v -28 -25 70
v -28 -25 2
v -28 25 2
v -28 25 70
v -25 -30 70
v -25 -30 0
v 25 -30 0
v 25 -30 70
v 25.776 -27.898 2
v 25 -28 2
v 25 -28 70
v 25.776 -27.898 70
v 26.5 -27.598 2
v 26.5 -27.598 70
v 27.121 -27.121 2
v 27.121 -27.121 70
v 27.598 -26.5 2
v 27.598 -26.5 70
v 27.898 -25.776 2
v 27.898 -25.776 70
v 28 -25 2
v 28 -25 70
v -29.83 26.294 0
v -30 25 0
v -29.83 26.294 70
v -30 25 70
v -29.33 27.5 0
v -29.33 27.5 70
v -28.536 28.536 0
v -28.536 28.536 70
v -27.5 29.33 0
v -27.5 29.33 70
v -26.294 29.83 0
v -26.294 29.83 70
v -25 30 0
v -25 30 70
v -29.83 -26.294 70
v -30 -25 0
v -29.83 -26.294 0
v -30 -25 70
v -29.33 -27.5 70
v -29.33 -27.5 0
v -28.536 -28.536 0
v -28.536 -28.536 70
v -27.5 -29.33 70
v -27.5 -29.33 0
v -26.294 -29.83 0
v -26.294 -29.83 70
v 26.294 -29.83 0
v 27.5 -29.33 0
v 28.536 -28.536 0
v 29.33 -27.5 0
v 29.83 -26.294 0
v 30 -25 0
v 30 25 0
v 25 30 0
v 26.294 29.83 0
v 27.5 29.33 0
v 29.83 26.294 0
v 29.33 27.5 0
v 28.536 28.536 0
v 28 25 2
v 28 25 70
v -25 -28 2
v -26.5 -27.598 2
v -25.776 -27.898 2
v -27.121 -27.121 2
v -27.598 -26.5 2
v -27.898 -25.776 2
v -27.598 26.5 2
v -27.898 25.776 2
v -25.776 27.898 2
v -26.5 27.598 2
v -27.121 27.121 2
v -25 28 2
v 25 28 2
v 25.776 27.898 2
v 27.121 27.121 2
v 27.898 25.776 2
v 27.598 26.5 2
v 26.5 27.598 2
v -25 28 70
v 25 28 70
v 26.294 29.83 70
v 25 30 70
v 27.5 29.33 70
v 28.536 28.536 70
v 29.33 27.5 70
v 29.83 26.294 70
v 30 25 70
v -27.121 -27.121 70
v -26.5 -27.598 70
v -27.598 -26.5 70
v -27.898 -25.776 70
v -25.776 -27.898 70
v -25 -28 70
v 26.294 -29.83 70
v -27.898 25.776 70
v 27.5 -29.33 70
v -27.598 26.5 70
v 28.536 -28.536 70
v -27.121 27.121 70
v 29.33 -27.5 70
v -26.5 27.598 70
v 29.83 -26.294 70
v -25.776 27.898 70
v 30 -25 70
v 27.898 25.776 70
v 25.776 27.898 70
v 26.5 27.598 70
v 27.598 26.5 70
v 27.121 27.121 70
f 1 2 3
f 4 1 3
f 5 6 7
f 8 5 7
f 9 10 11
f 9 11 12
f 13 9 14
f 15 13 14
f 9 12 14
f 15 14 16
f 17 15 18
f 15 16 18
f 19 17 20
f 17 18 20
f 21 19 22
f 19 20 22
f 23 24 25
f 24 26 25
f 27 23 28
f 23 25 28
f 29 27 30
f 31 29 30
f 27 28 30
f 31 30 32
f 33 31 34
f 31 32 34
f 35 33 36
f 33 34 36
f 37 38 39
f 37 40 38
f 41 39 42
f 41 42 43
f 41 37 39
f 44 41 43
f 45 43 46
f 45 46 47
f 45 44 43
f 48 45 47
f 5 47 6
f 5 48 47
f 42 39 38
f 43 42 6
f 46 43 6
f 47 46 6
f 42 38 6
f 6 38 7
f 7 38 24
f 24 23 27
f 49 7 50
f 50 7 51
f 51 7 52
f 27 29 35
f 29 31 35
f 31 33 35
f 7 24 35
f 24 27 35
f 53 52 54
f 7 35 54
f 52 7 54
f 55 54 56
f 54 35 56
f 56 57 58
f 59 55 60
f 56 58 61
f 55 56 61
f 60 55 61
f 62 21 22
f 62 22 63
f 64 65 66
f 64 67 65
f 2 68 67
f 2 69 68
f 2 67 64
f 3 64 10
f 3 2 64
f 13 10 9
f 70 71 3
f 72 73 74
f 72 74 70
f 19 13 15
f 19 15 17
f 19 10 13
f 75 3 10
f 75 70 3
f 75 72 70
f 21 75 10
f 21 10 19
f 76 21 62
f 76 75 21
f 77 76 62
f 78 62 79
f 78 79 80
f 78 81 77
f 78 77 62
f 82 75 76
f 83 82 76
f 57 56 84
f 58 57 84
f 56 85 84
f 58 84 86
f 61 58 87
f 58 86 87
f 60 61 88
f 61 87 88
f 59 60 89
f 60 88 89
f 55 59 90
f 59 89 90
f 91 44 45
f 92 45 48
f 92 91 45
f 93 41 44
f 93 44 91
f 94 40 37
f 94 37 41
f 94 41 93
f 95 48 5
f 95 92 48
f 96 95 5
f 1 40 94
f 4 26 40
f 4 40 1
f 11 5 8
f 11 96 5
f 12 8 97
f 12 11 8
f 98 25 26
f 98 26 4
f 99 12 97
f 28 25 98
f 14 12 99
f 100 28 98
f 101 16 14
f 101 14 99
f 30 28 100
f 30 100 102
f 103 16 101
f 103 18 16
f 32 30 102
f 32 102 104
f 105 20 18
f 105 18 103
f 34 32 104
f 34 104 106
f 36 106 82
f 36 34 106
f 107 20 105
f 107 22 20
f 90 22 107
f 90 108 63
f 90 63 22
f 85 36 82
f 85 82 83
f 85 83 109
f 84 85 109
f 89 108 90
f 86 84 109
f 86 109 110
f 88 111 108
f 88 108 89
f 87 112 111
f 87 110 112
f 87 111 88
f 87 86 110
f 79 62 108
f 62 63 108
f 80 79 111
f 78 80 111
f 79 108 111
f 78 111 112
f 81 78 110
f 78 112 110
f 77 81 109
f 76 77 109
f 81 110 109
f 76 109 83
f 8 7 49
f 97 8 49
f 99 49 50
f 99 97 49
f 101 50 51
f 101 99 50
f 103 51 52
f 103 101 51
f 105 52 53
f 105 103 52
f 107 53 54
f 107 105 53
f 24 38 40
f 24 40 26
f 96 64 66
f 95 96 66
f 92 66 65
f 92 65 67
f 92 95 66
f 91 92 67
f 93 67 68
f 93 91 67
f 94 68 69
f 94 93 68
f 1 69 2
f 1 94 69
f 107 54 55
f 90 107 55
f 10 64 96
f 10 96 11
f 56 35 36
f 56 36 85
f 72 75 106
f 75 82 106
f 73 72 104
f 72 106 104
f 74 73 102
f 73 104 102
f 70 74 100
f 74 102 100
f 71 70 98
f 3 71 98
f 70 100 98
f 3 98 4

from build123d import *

# Parameters (mm, degrees)
F2_W     = 56
F2_H     = 56
F3_DEPTH = 2
F2_W_2   = 60
F2_H_2   = 60
F4_DEPTH = 70
F5_R     = 5
F6_R     = 3


with BuildPart() as f3:
    # F2 (on Top) → F3 (new body)
    with BuildSketch(Plane.XY):
        Rectangle(F2_W, F2_H)
    extrude(amount=F3_DEPTH)

    # F2 (on Top) → F4 (join)
    with BuildSketch(Plane.XY):
        Rectangle(F2_W_2, F2_H_2)
        Rectangle(F2_W, F2_H, mode=Mode.SUBTRACT)
    extrude(amount=F4_DEPTH)

    # F5
    f5_edges = [f3.edges().sort_by_distance(p)[0] for p in [
        (30, -30, 35),
        (-30, -30, 35),
        (30, 30, 35),
        (-30, 30, 35),
    ]]
    fillet(f5_edges, radius=F5_R)

    # F6
    f6_edges = [f3.edges().sort_by_distance(p)[0] for p in [
        (-28, 28, 36),
        (28, 28, 36),
        (28, -28, 36),
        (-28, -28, 36),
    ]]
    fillet(f6_edges, radius=F6_R)


solid = f3.part
